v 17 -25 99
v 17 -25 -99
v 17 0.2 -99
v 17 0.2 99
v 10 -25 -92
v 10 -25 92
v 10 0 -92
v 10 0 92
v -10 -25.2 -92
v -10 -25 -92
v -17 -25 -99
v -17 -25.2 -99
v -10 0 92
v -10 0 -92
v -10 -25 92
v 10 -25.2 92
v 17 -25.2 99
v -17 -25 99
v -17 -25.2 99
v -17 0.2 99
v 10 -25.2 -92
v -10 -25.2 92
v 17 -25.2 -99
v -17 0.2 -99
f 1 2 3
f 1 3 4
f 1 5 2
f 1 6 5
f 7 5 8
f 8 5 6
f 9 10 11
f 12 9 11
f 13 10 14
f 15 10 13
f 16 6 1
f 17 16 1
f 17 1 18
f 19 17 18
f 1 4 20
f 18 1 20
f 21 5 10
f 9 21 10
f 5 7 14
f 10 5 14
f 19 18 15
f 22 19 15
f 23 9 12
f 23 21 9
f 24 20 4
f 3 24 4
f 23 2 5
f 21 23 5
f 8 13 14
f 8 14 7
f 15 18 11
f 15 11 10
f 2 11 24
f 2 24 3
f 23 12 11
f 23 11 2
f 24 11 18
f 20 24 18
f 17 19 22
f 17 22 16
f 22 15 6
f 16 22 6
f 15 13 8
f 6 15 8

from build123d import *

# Parameters (mm, degrees)
F0_W     = 34
F0_H     = 198
F1_DEPTH = 25
F2_DEPTH = 0.2
F3_W     = 20
F3_H     = 184
F4_DEPTH = 25
F6_DEPTH = 0.2


with BuildPart() as f1:
    # F0 (on Front) → F1 (new body)
    with BuildSketch(Plane.XZ):
        Rectangle(F0_W, F0_H)
    extrude(amount=F1_DEPTH)

    # F0 (on Front) → F2 (join)
    with BuildSketch(Plane.XZ):
        Rectangle(F0_W, F0_H)
    extrude(amount=-F2_DEPTH)

    # F3 (on face) → F4 (cut)
    with BuildSketch(Plane.XZ.offset(25)):
        Rectangle(F3_W, F3_H)
    extrude(amount=-F4_DEPTH, mode=Mode.SUBTRACT)

    # F5 (on face) → F6 (join)
    with BuildSketch(Plane.XZ.offset(25)):
        Polygon((17, 99), (-17, 99), (-10, 92), (10, 92), align=None)
        Polygon((-10, -92), (-17, -99), (17, -99), (10, -92), align=None)
    extrude(amount=F6_DEPTH)


solid = f1.part
